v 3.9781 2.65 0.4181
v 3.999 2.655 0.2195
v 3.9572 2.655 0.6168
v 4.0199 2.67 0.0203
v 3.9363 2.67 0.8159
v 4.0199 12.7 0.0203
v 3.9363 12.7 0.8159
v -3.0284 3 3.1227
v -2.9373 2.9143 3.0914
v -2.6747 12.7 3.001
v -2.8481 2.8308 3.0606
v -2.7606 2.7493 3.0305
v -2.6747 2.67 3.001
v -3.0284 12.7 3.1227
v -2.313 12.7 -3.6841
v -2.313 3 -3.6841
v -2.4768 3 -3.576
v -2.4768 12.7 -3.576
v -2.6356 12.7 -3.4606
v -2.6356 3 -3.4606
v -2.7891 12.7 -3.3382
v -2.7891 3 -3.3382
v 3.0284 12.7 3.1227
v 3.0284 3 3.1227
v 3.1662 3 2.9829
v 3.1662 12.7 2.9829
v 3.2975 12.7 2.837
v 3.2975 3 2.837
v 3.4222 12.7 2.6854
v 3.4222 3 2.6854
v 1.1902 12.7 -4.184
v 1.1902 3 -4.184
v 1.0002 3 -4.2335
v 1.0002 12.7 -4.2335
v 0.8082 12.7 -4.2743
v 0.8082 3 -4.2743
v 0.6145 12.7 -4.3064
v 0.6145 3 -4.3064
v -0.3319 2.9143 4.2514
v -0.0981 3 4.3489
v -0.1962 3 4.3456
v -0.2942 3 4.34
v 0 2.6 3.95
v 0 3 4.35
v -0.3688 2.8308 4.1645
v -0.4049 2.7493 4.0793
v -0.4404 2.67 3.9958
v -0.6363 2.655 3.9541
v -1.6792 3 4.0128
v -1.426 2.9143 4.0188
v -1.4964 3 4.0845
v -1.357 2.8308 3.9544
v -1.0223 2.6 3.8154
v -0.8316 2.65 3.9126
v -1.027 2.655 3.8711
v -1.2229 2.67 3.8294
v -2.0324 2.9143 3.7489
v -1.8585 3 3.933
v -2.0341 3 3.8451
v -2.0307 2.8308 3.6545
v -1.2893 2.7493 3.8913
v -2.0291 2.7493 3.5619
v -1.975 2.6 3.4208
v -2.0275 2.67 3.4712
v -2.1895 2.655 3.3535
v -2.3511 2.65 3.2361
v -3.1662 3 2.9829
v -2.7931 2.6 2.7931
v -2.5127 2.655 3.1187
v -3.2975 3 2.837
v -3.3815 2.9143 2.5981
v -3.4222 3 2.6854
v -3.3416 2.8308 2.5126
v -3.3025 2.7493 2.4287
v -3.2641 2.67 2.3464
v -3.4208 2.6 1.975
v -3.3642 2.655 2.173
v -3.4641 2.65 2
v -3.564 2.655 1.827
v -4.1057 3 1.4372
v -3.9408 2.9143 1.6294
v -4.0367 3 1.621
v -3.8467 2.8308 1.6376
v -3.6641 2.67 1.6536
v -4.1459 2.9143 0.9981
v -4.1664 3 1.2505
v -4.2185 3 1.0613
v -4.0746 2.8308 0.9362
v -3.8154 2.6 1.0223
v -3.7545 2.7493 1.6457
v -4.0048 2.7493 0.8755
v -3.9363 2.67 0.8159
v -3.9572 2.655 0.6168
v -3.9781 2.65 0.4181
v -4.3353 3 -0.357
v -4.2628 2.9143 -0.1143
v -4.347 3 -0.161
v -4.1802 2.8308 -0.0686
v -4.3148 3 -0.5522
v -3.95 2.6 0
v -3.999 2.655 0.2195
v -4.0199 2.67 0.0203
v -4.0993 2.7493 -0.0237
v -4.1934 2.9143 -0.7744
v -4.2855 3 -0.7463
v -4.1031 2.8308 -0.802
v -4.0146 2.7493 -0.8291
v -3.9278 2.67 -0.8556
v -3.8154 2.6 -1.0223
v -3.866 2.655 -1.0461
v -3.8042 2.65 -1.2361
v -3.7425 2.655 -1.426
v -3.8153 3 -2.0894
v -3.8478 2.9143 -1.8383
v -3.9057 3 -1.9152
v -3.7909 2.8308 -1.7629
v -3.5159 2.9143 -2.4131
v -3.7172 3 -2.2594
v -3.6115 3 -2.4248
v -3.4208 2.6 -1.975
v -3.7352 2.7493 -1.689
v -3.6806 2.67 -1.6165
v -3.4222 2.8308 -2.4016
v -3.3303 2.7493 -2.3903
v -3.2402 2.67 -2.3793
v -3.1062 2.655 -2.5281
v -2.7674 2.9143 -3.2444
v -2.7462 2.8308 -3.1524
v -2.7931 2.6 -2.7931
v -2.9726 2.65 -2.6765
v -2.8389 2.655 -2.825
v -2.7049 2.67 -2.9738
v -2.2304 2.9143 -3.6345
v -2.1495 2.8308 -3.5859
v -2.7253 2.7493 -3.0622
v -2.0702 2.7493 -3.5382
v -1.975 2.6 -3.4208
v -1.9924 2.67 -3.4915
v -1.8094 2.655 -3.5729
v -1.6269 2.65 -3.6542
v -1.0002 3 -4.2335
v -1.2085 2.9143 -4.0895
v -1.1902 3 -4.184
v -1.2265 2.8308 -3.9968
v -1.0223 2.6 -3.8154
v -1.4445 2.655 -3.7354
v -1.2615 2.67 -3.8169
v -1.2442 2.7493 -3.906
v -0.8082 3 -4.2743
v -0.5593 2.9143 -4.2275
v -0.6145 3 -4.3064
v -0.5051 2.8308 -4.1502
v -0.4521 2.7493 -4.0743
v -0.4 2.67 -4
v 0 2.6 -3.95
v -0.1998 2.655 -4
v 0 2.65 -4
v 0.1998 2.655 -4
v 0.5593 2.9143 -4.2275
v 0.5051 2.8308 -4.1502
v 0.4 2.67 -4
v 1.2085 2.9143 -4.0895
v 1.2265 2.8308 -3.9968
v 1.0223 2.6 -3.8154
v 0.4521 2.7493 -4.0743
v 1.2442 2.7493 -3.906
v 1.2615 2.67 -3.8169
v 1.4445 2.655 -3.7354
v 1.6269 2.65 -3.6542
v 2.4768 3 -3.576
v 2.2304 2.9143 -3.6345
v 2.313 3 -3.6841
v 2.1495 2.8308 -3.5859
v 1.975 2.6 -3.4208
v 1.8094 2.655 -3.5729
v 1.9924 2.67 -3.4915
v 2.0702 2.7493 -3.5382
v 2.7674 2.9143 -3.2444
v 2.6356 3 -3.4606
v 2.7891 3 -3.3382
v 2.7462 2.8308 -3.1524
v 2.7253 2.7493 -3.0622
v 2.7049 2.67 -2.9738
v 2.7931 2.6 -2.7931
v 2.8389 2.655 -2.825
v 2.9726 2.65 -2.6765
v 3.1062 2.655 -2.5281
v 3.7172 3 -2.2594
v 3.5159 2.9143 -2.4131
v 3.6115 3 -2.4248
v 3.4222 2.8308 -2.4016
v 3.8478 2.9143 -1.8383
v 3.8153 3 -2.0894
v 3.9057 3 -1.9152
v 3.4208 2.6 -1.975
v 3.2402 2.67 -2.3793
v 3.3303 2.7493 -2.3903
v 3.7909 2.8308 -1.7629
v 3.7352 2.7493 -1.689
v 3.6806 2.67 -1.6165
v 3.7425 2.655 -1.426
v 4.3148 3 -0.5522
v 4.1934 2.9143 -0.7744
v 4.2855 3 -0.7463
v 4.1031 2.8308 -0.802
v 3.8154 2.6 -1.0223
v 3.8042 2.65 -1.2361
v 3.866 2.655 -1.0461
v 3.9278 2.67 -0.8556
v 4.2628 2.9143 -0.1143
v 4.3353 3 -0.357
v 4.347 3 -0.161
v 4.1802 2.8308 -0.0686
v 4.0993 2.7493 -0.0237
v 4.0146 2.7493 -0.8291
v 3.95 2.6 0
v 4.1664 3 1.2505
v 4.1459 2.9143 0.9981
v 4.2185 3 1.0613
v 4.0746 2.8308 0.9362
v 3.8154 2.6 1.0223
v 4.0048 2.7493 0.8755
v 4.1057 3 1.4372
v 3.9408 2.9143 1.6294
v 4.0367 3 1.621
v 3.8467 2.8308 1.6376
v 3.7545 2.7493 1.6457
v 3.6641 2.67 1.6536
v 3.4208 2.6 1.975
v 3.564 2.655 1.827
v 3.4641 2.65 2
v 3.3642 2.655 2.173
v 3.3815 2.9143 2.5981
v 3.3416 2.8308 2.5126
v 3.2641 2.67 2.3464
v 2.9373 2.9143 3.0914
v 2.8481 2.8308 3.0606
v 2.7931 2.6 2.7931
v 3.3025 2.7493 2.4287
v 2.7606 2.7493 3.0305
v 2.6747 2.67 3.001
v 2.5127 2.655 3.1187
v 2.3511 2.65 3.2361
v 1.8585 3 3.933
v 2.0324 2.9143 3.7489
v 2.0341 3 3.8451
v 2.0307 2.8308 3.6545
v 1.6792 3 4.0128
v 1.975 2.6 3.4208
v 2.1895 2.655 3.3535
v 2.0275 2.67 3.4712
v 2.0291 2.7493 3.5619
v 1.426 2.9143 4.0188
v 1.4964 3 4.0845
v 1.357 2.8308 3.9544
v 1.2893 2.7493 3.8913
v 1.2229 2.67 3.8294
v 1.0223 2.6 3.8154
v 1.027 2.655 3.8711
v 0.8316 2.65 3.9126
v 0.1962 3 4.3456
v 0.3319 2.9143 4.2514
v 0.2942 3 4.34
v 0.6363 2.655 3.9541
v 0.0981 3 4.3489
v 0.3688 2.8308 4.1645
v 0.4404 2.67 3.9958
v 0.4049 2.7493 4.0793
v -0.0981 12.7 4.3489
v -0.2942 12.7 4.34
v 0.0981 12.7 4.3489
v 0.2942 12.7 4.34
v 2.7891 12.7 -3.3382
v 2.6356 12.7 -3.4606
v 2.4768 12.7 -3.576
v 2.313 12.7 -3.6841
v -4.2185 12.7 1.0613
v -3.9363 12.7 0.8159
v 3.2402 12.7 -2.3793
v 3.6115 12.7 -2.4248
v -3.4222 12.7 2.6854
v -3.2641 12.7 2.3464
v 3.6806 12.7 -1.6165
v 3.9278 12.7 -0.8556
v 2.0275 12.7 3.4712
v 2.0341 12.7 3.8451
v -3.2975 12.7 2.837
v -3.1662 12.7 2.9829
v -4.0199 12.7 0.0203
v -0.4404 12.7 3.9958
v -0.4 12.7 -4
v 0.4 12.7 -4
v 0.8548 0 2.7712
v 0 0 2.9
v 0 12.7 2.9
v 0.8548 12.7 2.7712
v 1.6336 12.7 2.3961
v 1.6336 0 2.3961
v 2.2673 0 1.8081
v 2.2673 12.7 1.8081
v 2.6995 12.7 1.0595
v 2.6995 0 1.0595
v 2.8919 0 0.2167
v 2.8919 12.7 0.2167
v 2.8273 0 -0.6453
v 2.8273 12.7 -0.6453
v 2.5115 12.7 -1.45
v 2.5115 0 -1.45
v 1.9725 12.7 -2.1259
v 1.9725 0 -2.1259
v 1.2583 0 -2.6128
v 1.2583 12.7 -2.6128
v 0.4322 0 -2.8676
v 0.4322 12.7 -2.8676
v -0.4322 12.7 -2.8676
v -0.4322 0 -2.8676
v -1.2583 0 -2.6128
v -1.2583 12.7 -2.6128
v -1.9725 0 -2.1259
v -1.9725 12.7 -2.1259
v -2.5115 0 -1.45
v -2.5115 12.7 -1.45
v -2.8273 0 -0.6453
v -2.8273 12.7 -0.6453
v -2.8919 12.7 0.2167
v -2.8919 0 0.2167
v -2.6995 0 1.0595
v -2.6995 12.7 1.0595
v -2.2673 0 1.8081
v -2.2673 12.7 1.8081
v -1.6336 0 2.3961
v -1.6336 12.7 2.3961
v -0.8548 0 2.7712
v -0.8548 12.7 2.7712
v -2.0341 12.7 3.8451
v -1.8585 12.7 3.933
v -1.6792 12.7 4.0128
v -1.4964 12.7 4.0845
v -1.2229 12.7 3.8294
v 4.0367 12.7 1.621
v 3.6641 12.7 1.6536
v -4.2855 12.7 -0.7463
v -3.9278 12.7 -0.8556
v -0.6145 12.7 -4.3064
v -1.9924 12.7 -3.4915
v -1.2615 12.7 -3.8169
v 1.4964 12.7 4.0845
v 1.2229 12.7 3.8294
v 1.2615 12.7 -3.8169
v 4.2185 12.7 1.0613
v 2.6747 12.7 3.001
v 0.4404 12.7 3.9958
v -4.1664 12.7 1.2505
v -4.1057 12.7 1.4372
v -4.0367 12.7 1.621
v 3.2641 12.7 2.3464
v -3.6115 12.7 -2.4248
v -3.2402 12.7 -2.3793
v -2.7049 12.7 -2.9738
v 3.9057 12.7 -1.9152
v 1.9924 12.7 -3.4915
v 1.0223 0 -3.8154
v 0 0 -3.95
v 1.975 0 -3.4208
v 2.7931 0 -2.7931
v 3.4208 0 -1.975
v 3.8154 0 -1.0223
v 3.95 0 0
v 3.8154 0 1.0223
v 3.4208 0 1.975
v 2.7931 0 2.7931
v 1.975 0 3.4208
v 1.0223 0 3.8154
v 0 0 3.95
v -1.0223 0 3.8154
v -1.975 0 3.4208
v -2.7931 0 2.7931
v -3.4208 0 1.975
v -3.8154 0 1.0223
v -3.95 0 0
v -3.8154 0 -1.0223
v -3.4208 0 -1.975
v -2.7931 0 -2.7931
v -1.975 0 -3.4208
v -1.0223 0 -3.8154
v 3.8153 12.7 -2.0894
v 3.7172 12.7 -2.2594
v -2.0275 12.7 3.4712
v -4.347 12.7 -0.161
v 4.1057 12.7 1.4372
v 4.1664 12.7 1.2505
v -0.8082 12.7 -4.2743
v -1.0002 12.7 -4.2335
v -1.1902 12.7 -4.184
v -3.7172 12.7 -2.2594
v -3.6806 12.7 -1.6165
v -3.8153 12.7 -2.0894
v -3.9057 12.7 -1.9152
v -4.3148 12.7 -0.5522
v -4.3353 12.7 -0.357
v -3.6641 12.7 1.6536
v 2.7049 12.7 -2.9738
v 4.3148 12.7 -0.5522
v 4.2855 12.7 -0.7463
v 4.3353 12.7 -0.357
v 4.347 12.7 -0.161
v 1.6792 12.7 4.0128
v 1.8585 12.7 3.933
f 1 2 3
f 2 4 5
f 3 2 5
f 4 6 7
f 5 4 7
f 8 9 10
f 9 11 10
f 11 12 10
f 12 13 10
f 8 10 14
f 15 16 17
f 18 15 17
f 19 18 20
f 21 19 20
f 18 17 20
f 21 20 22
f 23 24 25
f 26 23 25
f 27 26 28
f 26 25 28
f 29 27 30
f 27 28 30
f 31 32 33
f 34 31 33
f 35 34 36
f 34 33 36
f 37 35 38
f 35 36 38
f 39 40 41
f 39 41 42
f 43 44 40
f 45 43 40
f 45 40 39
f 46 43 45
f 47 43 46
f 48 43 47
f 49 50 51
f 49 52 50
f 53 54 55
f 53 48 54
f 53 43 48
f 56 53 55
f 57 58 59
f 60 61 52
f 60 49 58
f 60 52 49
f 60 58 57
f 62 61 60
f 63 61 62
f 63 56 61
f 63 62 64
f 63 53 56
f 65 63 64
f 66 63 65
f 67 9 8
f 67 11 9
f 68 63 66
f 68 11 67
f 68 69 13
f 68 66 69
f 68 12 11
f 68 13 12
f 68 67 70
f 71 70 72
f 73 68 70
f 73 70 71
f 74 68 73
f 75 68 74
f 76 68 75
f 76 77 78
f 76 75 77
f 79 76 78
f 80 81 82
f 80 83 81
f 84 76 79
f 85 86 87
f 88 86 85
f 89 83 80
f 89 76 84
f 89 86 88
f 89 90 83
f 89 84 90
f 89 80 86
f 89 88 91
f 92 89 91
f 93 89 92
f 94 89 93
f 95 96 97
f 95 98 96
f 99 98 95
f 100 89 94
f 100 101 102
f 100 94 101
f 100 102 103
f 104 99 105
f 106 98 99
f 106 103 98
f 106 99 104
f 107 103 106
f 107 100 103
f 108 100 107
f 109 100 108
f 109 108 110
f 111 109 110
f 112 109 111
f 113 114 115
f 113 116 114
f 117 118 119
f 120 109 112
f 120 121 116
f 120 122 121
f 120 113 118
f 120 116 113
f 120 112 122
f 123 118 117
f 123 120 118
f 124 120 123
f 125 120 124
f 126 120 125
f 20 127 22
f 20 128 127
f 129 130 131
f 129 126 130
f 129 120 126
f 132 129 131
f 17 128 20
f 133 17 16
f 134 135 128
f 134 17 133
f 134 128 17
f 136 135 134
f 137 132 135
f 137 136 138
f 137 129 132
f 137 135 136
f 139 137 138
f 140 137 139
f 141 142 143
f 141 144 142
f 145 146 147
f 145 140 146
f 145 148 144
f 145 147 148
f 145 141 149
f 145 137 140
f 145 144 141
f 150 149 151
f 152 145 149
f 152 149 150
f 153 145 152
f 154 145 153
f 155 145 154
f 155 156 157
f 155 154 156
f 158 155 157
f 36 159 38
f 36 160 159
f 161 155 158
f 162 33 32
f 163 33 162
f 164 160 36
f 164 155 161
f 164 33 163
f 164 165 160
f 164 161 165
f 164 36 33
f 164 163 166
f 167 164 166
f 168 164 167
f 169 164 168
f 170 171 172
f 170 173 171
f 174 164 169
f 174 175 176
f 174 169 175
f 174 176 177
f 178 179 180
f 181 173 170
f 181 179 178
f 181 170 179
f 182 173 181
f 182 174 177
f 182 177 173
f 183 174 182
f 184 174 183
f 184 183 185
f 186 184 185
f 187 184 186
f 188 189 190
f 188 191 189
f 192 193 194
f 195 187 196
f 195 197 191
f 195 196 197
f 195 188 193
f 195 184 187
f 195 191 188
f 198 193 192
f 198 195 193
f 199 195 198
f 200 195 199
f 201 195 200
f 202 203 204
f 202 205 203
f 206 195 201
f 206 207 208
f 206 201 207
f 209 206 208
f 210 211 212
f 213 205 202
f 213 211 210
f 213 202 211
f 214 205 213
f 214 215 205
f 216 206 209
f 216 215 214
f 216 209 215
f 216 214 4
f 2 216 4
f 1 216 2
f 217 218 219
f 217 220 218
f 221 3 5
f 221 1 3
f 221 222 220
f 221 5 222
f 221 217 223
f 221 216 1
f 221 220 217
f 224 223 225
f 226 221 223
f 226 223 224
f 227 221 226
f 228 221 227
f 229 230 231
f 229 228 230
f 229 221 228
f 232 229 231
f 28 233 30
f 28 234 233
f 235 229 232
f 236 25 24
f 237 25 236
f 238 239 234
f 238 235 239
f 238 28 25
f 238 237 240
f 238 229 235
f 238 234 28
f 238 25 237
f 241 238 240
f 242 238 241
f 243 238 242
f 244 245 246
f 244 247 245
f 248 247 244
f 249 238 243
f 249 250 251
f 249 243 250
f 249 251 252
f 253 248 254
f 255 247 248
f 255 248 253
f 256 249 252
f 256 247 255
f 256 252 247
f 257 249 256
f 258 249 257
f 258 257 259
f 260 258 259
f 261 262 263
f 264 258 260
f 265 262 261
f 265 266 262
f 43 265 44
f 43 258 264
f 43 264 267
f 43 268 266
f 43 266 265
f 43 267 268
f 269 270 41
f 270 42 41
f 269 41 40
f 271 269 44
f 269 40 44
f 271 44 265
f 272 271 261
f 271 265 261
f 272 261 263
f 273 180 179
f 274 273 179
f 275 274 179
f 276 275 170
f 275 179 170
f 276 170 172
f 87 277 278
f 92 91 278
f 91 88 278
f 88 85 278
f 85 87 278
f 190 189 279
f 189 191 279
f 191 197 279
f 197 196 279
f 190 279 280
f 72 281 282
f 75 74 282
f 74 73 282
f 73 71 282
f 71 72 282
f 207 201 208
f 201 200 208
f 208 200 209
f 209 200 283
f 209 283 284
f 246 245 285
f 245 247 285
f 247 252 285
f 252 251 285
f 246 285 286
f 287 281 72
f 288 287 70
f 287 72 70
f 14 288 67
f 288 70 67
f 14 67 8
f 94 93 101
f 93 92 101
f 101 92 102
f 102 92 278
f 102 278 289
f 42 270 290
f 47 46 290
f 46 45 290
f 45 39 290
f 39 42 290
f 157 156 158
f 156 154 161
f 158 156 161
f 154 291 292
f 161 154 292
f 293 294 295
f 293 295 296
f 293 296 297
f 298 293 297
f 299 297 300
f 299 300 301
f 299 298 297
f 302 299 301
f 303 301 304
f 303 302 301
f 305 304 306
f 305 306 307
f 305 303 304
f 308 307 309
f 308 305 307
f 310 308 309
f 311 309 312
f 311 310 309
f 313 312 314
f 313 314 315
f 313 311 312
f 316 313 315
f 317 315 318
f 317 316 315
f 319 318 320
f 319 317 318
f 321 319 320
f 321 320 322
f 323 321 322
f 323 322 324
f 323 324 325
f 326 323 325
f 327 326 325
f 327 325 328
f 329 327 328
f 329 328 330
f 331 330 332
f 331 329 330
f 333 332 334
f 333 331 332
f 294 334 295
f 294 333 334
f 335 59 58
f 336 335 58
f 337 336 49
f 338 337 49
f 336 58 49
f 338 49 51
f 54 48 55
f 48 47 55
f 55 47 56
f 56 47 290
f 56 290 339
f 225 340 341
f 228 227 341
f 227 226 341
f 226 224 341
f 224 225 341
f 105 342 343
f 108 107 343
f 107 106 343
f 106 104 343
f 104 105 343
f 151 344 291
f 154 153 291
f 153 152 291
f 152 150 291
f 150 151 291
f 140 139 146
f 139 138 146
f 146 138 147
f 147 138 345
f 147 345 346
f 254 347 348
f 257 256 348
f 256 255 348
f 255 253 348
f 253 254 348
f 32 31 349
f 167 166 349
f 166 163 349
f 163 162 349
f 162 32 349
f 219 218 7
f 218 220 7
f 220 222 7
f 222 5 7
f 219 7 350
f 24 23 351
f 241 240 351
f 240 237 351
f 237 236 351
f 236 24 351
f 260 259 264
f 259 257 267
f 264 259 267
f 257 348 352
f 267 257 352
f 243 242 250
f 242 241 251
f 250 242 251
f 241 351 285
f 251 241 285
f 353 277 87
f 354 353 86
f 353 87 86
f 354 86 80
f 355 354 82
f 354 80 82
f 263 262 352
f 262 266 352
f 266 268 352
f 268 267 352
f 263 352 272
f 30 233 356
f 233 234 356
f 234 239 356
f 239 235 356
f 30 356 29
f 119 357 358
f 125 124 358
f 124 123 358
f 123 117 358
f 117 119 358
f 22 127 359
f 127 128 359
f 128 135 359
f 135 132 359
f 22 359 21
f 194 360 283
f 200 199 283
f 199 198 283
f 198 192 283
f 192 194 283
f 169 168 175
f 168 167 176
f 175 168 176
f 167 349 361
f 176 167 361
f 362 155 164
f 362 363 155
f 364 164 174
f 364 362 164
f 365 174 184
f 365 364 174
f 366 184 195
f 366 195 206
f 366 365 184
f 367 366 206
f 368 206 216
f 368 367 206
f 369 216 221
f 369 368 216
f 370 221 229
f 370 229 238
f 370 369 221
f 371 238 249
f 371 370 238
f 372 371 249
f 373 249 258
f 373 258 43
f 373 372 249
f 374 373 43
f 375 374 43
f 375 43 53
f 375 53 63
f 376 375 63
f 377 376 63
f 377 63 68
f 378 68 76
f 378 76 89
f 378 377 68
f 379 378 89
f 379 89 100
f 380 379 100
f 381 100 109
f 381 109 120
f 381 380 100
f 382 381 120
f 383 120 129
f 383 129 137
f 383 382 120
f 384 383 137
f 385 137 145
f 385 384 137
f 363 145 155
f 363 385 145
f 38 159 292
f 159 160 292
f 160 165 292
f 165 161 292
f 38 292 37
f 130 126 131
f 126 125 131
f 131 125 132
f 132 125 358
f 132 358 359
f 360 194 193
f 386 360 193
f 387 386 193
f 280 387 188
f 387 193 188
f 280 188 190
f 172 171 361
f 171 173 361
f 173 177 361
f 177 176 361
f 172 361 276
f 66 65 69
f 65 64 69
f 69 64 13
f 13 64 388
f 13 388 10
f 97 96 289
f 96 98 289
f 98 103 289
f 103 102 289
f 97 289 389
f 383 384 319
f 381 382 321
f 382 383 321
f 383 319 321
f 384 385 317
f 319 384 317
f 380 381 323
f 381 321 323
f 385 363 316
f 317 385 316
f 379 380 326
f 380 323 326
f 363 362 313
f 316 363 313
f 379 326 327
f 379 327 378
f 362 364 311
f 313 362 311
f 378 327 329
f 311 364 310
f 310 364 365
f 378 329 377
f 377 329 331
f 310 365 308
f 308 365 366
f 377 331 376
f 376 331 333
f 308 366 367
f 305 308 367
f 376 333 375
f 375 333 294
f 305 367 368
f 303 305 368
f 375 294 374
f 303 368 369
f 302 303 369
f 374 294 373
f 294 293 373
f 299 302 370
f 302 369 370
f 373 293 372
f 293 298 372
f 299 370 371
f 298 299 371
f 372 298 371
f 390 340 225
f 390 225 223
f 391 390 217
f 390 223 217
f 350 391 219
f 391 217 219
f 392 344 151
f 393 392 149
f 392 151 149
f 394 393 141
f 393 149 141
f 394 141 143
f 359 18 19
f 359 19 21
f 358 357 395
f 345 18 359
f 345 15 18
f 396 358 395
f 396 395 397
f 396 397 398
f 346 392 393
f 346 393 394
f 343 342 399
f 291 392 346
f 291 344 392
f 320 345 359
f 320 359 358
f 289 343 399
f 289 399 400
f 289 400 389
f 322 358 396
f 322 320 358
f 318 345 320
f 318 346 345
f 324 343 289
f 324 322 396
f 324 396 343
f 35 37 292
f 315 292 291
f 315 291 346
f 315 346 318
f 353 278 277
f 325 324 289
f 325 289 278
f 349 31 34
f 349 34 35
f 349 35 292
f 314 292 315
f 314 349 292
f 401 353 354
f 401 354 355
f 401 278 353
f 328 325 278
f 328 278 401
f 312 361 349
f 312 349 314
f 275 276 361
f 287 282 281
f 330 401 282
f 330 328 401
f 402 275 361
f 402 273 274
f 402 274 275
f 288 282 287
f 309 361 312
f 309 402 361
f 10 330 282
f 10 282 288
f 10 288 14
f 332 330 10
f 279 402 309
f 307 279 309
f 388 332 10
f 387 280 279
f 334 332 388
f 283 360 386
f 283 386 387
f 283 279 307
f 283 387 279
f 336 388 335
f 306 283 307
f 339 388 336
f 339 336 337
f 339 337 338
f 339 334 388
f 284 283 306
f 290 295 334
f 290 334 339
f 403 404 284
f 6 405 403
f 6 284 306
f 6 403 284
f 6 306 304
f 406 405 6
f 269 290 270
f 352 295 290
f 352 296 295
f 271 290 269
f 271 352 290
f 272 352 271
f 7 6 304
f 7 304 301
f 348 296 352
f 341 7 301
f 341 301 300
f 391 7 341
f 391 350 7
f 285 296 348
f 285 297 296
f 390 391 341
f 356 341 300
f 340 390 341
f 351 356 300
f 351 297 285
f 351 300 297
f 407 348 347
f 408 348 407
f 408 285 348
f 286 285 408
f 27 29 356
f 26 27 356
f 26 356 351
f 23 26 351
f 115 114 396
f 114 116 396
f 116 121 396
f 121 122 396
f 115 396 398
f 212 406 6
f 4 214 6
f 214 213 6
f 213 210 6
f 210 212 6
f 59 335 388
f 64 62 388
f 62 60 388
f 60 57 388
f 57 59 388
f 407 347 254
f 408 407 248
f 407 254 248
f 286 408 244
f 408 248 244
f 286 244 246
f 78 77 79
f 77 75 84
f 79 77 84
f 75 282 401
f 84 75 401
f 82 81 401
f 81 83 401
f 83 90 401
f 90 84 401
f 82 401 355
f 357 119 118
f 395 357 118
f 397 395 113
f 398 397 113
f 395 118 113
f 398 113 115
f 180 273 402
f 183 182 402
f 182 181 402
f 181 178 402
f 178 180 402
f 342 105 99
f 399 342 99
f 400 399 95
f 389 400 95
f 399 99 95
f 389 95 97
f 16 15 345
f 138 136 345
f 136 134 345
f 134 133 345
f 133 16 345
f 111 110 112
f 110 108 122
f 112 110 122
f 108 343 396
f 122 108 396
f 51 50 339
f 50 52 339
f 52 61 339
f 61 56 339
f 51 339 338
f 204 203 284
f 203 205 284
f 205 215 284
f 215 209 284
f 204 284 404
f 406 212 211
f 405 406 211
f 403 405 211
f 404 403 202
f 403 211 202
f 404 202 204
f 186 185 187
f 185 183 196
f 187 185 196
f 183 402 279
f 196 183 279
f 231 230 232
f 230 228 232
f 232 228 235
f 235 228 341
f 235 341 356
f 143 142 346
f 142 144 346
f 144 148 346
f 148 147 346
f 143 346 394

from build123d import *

# Parameters (mm, degrees)
ESQUISSE1_R             = 4.35
ESQUISSE1_R_2           = 2.9
BOSS_EXTRU_1_DEPTH      = 12.7
ESQUISSE2_OUTSIDE_W     = 14.236
ESQUISSE2_OUTSIDE_H     = 14.236
ESQUISSE2_OUTSIDE_R     = 3.95
ENL_V_MAT_EXTRU_1_DEPTH = 2
CHANFREIN1_SIZE         = 1
ENL_V_MAT_EXTRU_2_DEPTH = 15.111520117


with BuildPart() as part:
    # Esquisse1 → Boss.-Extru.1 (new body)
    with BuildSketch(Plane(origin=(0, 0, 0), x_dir=(1, 0, 0), z_dir=(0, 1, 0))):
        with Locations(Location((0, 0, 0), (0, 0, 270))):
            Circle(ESQUISSE1_R)
        with Locations(Location((0, 0, 0), (0, 0, 270))):
            Circle(ESQUISSE1_R_2, mode=Mode.SUBTRACT)
    extrude(amount=BOSS_EXTRU_1_DEPTH)

    # Esquisse2 outside → Enlèv. mat.-Extru.1 (cut)
    with BuildSketch(Plane.XZ):
        Rectangle(ESQUISSE2_OUTSIDE_W, ESQUISSE2_OUTSIDE_H)
        with Locations(Location((0, 0, 0), (0, 0, 270))):
            Circle(ESQUISSE2_OUTSIDE_R, mode=Mode.SUBTRACT)
    extrude(amount=-ENL_V_MAT_EXTRU_1_DEPTH, mode=Mode.SUBTRACT)

    # Chanfrein1
    # the kernel refuses this chamfer: 1 mm, written as the material it takes off along each edge
    with BuildSketch(Plane(origin=(0, 2, 0), x_dir=(0, 0, 1), z_dir=(1, 0, 0))) as chanfrein1_piece_1_section:
        Polygon((4.35, -CHANFREIN1_SIZE), (4.35 - CHANFREIN1_SIZE, 0), (4.35, 0), align=None)
    chanfrein1_piece_1 = revolve(axis=Axis((0, 2, 0), (0, -1, 0)), mode=Mode.PRIVATE)
    chanfrein1_piece_1 = chanfrein1_piece_1 - Plane(origin=(0, 2.799298708, 0), x_dir=(0, 0, -1), z_dir=(0, -1, 0)) * Cylinder(3.95, 18, mode=Mode.PRIVATE)
    add(chanfrein1_piece_1, mode=Mode.SUBTRACT)

    # Esquisse3 → Enlèv. mat.-Extru.2 (cut, through all)
    with BuildSketch(Plane(origin=(0, 12.7, 0), x_dir=(1, 0, 0), z_dir=(0, 1, 0))):
        Polygon((1, 4.856888804), (-1, 4.856888804), (-0.4, 4), (0.4, 4), align=None)
        Polygon((2.889020106, 4.030252062), (1.06192919, 4.843725348), (1.261528389, 3.816876488), (1.992364755, 3.491487173), align=None)
        Polygon((4.278502389, 2.506748125), (2.940241176, 3.993037776), (2.704927059, 2.973780356), (3.240231544, 2.379264495), align=None)
        Polygon((4.92819274, 0.549804664), (4.310158752, 2.451917697), (3.680619267, 1.616490584), (3.927832863, 0.855645371), align=None)
        Polygon((4.725753796, -1.502205018), (4.934810722, 0.486838772), (4.019898967, -0.020305095), (3.936276196, -0.815922611), align=None)
        Polygon((3.706189088, -3.294469806), (4.706189088, -1.562418998), (3.664101615, -1.653589838), (3.264101615, -2.346410162), align=None)
        Polygon((2.045790617, -4.517090835), (3.663824605, -3.34152033), (2.674747807, -3.000953877), (2.027534211, -3.471182078), align=None)
        Polygon((0.031656363, -4.958665822), (1.987951564, -4.54284244), (1.222905804, -3.829425727), (0.440387723, -3.995755079), align=None)
        Polygon((-1.987951564, -4.54284244), (-0.031656363, -4.958665822), (-0.440387723, -3.995755079), (-1.222905804, -3.829425727), align=None)
        Polygon((-3.663824605, -3.34152033), (-2.045790617, -4.517090835), (-2.027534211, -3.471182078), (-2.674747807, -3.000953877), align=None)
        Polygon((-4.706189088, -1.562418998), (-3.706189088, -3.294469806), (-3.264101615, -2.346410162), (-3.664101615, -1.653589838), align=None)
        Polygon((-4.934810722, 0.486838772), (-4.725753796, -1.502205018), (-3.936276196, -0.815922611), (-4.019898967, -0.020305095), align=None)
        Polygon((-4.310158752, 2.451917697), (-4.92819274, 0.549804664), (-3.927832863, 0.855645371), (-3.680619267, 1.616490584), align=None)
        Polygon((-2.940241176, 3.993037776), (-4.278502389, 2.506748125), (-3.240231544, 2.379264495), (-2.704927059, 2.973780356), align=None)
        Polygon((-1.06192919, 4.843725348), (-2.889020106, 4.030252062), (-1.992364755, 3.491487173), (-1.261528389, 3.816876488), align=None)
    extrude(amount=-ENL_V_MAT_EXTRU_2_DEPTH, mode=Mode.SUBTRACT)


solid = part.part
